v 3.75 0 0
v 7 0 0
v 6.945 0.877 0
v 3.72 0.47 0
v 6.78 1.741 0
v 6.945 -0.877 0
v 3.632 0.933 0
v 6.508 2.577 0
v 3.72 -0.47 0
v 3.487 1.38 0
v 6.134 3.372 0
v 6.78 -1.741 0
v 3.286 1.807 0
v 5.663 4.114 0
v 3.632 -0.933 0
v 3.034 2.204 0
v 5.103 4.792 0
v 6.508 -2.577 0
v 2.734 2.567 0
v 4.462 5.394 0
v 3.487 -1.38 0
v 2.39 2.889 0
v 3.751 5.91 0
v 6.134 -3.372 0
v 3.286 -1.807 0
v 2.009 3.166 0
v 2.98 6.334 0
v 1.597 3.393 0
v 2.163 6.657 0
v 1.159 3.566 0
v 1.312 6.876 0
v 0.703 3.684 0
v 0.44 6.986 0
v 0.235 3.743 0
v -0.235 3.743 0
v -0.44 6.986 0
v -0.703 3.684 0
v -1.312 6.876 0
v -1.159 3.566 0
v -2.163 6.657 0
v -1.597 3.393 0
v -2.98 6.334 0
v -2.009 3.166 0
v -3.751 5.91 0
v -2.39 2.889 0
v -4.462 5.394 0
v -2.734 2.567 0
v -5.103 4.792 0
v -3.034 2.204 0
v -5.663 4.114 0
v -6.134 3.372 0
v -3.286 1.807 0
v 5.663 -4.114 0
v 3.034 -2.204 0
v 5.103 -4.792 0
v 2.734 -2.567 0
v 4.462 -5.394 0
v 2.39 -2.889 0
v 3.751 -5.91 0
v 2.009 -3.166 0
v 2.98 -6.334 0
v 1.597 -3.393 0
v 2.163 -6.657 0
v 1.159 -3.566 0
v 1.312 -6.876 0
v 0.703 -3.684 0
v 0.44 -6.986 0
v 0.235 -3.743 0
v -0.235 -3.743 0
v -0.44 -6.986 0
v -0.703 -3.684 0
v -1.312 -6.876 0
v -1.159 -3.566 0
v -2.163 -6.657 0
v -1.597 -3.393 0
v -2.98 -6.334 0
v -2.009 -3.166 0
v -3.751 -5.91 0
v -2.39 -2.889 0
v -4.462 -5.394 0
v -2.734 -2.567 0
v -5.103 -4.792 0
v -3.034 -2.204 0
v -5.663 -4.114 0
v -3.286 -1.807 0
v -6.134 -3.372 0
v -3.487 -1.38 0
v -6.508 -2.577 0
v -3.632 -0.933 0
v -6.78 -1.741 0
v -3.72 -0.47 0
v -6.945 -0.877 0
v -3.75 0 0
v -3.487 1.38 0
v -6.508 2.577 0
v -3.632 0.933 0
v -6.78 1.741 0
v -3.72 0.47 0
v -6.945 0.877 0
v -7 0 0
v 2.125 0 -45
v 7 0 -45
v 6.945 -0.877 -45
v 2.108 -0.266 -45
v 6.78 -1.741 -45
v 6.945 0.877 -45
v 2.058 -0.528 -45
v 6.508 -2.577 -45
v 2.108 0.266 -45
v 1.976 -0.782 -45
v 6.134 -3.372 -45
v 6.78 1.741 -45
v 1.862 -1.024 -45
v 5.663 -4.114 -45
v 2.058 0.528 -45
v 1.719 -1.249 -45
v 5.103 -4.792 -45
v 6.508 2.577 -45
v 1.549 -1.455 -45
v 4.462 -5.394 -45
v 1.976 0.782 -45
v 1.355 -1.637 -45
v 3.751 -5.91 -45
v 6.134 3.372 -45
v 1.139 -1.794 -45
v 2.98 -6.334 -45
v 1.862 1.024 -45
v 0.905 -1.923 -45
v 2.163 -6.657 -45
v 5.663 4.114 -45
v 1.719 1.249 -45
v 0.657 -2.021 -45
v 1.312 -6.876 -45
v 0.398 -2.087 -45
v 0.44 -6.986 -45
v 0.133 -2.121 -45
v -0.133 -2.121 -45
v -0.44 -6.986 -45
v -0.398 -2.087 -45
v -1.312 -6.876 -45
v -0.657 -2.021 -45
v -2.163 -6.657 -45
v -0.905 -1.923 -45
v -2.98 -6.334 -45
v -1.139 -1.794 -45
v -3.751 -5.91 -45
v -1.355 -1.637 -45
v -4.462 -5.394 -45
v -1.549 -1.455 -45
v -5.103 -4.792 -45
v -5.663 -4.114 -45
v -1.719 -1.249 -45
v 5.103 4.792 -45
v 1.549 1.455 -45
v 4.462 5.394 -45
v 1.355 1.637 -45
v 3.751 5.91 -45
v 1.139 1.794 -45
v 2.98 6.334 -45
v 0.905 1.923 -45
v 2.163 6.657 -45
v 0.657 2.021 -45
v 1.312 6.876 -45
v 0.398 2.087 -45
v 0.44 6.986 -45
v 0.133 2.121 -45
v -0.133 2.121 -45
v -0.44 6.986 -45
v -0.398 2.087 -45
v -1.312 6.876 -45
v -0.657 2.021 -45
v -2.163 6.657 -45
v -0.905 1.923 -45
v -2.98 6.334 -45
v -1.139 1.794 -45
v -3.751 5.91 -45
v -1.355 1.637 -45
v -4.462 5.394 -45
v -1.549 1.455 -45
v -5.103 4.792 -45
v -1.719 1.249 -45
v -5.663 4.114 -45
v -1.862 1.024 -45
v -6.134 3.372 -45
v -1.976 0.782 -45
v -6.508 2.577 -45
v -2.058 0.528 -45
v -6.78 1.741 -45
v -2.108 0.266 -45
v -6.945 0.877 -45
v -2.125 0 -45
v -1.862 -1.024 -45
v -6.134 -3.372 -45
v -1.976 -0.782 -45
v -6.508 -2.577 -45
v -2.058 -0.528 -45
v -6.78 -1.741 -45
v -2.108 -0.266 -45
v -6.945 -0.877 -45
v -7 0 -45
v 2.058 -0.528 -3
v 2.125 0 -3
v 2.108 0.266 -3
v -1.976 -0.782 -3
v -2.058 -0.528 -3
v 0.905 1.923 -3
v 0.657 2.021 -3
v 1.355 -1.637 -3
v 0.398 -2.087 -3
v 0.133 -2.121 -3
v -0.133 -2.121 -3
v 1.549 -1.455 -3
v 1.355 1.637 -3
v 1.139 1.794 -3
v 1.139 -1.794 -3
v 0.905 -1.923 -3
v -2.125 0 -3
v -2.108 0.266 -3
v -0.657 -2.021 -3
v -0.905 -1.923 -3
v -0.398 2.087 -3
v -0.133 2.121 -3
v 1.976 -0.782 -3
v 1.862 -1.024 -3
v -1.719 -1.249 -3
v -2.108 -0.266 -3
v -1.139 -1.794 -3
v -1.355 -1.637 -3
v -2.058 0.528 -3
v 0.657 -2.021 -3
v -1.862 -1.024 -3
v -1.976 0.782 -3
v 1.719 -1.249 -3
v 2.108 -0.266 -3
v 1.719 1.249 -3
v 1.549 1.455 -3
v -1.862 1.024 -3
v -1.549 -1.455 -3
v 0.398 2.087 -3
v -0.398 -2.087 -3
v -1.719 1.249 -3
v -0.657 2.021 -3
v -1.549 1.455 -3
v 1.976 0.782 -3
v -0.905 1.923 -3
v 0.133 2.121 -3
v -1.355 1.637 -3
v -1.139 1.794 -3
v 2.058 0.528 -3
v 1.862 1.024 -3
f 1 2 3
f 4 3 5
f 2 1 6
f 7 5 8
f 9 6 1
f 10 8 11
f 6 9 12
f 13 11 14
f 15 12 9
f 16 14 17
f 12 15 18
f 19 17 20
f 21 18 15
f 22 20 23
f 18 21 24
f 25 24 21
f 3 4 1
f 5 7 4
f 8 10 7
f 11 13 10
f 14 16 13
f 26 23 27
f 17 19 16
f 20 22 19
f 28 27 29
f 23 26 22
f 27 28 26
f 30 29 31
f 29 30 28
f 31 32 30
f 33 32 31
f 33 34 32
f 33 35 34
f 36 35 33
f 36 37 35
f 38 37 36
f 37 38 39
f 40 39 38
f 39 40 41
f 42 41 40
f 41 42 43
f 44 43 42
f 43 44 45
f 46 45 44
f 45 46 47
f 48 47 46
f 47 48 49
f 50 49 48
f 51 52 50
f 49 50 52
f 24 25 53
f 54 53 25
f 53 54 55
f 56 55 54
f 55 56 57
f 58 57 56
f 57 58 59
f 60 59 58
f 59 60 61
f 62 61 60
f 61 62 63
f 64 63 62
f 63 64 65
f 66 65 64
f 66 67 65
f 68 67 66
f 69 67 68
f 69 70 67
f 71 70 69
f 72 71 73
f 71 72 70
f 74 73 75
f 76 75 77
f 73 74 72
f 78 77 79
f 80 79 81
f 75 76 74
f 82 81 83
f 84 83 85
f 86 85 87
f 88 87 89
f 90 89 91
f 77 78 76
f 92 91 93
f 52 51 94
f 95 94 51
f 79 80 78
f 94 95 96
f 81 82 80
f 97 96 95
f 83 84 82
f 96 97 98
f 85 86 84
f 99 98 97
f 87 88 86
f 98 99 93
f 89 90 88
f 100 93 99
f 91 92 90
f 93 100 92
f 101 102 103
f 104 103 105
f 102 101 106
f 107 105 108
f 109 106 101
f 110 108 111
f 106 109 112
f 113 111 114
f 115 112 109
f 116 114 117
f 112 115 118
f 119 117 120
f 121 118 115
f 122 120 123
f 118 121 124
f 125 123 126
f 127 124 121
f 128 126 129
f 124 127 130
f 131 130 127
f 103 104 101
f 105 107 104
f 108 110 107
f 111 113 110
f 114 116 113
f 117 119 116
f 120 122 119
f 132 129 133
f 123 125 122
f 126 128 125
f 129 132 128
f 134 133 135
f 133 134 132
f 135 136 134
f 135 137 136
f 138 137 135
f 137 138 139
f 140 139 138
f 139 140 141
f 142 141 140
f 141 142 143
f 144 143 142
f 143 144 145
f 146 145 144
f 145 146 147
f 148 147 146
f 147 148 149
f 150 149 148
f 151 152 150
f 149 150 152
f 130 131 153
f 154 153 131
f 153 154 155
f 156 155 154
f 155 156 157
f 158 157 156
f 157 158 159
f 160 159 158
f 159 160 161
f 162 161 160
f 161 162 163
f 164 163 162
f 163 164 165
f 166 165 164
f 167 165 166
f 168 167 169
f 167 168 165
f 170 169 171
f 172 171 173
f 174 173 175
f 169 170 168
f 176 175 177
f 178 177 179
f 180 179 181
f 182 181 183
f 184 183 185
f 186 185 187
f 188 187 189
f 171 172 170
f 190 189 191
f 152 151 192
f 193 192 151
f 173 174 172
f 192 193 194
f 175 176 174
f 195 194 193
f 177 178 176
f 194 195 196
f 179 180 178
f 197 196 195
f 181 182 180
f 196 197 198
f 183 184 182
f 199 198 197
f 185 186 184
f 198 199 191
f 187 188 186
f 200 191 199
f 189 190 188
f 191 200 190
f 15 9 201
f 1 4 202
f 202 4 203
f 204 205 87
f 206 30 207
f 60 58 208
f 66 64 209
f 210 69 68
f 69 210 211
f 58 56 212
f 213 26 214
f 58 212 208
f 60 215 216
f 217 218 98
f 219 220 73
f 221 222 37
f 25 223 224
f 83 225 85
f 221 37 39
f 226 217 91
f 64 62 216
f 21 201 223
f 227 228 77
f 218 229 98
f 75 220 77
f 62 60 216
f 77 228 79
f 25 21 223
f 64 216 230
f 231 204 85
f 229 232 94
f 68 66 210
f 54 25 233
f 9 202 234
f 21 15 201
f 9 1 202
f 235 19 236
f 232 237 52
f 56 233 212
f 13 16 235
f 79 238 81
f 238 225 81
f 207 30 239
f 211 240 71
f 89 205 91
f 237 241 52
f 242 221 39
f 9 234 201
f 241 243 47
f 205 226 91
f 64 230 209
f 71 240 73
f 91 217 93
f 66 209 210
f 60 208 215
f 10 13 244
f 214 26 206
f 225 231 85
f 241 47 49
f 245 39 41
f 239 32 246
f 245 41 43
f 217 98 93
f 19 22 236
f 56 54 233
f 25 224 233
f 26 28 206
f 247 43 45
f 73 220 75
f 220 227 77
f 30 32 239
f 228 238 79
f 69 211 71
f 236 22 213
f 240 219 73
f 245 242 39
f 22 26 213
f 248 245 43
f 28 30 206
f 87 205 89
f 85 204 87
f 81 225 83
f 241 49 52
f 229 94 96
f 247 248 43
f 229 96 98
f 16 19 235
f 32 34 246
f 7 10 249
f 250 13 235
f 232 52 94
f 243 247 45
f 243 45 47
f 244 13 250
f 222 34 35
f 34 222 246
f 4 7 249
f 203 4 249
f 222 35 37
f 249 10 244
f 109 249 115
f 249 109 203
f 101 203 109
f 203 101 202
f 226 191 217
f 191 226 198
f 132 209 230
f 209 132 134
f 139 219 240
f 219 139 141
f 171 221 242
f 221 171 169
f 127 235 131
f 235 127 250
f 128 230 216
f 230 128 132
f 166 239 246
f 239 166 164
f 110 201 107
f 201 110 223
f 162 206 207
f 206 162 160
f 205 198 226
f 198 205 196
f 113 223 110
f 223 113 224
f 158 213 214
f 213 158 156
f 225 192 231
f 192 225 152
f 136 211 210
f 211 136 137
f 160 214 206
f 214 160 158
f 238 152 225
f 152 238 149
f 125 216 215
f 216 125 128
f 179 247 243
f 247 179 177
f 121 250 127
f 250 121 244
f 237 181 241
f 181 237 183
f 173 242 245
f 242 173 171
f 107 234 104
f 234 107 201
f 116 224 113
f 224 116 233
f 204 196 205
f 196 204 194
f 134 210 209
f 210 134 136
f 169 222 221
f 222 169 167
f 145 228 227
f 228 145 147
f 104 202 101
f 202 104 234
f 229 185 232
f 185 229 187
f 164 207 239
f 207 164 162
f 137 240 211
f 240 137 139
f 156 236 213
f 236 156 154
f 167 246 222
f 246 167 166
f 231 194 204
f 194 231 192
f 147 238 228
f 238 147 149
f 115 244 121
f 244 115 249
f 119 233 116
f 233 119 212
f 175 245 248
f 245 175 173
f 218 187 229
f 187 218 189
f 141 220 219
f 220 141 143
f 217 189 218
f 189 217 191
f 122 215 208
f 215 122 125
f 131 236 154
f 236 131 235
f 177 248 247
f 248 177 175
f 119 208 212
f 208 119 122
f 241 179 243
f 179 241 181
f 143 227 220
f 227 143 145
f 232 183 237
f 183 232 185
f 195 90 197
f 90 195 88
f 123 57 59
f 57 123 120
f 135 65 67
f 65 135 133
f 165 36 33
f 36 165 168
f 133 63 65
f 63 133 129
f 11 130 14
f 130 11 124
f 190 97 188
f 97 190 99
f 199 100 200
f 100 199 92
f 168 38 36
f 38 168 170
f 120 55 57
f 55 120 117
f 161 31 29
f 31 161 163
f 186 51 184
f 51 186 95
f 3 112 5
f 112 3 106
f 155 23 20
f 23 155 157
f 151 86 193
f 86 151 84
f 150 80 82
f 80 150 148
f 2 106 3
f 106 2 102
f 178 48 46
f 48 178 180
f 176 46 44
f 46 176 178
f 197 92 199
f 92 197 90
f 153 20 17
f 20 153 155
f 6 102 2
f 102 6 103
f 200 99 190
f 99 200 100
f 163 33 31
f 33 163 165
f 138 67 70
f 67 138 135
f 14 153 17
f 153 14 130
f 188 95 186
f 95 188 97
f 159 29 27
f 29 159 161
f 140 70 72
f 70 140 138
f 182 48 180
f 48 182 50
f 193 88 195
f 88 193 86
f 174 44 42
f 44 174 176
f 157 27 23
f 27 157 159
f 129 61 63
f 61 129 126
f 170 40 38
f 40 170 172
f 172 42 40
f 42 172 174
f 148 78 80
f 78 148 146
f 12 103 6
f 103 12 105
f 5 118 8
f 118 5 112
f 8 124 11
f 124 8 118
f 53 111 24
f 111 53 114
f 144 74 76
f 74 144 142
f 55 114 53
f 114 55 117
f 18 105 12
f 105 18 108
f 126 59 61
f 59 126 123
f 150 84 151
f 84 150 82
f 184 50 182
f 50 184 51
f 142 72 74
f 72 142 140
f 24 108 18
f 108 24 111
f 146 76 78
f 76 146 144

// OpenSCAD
$fn = 50;


difference() {
	union() {
		translate(v = [0, 0, -45.0000000000]) {
			cylinder(h = 45, r = 7.0000000000);
		}
		cylinder(h = 0, r = 10.0000000000);
	}
	union() {
		translate(v = [0, 0, 0]) {
			rotate(a = [0, 0, 0]) {
				difference() {
					union() {
						#translate(v = [0, 0, -45.0000000000]) {
							cylinder(h = 45, r = 2.0000000000);
						}
						#translate(v = [0, 0, -3]) {
							cylinder(h = 3, r1 = 2.1250000000, r2 = 3.7500000000);
						}
						#translate(v = [0, 0, -45.0000000000]) {
							cylinder(h = 45, r = 2.1250000000);
						}
						#translate(v = [0, 0, -45.0000000000]) {
							cylinder(h = 45, r = 2.0000000000);
						}
					}
					union();
				}
			}
		}
	}
}
